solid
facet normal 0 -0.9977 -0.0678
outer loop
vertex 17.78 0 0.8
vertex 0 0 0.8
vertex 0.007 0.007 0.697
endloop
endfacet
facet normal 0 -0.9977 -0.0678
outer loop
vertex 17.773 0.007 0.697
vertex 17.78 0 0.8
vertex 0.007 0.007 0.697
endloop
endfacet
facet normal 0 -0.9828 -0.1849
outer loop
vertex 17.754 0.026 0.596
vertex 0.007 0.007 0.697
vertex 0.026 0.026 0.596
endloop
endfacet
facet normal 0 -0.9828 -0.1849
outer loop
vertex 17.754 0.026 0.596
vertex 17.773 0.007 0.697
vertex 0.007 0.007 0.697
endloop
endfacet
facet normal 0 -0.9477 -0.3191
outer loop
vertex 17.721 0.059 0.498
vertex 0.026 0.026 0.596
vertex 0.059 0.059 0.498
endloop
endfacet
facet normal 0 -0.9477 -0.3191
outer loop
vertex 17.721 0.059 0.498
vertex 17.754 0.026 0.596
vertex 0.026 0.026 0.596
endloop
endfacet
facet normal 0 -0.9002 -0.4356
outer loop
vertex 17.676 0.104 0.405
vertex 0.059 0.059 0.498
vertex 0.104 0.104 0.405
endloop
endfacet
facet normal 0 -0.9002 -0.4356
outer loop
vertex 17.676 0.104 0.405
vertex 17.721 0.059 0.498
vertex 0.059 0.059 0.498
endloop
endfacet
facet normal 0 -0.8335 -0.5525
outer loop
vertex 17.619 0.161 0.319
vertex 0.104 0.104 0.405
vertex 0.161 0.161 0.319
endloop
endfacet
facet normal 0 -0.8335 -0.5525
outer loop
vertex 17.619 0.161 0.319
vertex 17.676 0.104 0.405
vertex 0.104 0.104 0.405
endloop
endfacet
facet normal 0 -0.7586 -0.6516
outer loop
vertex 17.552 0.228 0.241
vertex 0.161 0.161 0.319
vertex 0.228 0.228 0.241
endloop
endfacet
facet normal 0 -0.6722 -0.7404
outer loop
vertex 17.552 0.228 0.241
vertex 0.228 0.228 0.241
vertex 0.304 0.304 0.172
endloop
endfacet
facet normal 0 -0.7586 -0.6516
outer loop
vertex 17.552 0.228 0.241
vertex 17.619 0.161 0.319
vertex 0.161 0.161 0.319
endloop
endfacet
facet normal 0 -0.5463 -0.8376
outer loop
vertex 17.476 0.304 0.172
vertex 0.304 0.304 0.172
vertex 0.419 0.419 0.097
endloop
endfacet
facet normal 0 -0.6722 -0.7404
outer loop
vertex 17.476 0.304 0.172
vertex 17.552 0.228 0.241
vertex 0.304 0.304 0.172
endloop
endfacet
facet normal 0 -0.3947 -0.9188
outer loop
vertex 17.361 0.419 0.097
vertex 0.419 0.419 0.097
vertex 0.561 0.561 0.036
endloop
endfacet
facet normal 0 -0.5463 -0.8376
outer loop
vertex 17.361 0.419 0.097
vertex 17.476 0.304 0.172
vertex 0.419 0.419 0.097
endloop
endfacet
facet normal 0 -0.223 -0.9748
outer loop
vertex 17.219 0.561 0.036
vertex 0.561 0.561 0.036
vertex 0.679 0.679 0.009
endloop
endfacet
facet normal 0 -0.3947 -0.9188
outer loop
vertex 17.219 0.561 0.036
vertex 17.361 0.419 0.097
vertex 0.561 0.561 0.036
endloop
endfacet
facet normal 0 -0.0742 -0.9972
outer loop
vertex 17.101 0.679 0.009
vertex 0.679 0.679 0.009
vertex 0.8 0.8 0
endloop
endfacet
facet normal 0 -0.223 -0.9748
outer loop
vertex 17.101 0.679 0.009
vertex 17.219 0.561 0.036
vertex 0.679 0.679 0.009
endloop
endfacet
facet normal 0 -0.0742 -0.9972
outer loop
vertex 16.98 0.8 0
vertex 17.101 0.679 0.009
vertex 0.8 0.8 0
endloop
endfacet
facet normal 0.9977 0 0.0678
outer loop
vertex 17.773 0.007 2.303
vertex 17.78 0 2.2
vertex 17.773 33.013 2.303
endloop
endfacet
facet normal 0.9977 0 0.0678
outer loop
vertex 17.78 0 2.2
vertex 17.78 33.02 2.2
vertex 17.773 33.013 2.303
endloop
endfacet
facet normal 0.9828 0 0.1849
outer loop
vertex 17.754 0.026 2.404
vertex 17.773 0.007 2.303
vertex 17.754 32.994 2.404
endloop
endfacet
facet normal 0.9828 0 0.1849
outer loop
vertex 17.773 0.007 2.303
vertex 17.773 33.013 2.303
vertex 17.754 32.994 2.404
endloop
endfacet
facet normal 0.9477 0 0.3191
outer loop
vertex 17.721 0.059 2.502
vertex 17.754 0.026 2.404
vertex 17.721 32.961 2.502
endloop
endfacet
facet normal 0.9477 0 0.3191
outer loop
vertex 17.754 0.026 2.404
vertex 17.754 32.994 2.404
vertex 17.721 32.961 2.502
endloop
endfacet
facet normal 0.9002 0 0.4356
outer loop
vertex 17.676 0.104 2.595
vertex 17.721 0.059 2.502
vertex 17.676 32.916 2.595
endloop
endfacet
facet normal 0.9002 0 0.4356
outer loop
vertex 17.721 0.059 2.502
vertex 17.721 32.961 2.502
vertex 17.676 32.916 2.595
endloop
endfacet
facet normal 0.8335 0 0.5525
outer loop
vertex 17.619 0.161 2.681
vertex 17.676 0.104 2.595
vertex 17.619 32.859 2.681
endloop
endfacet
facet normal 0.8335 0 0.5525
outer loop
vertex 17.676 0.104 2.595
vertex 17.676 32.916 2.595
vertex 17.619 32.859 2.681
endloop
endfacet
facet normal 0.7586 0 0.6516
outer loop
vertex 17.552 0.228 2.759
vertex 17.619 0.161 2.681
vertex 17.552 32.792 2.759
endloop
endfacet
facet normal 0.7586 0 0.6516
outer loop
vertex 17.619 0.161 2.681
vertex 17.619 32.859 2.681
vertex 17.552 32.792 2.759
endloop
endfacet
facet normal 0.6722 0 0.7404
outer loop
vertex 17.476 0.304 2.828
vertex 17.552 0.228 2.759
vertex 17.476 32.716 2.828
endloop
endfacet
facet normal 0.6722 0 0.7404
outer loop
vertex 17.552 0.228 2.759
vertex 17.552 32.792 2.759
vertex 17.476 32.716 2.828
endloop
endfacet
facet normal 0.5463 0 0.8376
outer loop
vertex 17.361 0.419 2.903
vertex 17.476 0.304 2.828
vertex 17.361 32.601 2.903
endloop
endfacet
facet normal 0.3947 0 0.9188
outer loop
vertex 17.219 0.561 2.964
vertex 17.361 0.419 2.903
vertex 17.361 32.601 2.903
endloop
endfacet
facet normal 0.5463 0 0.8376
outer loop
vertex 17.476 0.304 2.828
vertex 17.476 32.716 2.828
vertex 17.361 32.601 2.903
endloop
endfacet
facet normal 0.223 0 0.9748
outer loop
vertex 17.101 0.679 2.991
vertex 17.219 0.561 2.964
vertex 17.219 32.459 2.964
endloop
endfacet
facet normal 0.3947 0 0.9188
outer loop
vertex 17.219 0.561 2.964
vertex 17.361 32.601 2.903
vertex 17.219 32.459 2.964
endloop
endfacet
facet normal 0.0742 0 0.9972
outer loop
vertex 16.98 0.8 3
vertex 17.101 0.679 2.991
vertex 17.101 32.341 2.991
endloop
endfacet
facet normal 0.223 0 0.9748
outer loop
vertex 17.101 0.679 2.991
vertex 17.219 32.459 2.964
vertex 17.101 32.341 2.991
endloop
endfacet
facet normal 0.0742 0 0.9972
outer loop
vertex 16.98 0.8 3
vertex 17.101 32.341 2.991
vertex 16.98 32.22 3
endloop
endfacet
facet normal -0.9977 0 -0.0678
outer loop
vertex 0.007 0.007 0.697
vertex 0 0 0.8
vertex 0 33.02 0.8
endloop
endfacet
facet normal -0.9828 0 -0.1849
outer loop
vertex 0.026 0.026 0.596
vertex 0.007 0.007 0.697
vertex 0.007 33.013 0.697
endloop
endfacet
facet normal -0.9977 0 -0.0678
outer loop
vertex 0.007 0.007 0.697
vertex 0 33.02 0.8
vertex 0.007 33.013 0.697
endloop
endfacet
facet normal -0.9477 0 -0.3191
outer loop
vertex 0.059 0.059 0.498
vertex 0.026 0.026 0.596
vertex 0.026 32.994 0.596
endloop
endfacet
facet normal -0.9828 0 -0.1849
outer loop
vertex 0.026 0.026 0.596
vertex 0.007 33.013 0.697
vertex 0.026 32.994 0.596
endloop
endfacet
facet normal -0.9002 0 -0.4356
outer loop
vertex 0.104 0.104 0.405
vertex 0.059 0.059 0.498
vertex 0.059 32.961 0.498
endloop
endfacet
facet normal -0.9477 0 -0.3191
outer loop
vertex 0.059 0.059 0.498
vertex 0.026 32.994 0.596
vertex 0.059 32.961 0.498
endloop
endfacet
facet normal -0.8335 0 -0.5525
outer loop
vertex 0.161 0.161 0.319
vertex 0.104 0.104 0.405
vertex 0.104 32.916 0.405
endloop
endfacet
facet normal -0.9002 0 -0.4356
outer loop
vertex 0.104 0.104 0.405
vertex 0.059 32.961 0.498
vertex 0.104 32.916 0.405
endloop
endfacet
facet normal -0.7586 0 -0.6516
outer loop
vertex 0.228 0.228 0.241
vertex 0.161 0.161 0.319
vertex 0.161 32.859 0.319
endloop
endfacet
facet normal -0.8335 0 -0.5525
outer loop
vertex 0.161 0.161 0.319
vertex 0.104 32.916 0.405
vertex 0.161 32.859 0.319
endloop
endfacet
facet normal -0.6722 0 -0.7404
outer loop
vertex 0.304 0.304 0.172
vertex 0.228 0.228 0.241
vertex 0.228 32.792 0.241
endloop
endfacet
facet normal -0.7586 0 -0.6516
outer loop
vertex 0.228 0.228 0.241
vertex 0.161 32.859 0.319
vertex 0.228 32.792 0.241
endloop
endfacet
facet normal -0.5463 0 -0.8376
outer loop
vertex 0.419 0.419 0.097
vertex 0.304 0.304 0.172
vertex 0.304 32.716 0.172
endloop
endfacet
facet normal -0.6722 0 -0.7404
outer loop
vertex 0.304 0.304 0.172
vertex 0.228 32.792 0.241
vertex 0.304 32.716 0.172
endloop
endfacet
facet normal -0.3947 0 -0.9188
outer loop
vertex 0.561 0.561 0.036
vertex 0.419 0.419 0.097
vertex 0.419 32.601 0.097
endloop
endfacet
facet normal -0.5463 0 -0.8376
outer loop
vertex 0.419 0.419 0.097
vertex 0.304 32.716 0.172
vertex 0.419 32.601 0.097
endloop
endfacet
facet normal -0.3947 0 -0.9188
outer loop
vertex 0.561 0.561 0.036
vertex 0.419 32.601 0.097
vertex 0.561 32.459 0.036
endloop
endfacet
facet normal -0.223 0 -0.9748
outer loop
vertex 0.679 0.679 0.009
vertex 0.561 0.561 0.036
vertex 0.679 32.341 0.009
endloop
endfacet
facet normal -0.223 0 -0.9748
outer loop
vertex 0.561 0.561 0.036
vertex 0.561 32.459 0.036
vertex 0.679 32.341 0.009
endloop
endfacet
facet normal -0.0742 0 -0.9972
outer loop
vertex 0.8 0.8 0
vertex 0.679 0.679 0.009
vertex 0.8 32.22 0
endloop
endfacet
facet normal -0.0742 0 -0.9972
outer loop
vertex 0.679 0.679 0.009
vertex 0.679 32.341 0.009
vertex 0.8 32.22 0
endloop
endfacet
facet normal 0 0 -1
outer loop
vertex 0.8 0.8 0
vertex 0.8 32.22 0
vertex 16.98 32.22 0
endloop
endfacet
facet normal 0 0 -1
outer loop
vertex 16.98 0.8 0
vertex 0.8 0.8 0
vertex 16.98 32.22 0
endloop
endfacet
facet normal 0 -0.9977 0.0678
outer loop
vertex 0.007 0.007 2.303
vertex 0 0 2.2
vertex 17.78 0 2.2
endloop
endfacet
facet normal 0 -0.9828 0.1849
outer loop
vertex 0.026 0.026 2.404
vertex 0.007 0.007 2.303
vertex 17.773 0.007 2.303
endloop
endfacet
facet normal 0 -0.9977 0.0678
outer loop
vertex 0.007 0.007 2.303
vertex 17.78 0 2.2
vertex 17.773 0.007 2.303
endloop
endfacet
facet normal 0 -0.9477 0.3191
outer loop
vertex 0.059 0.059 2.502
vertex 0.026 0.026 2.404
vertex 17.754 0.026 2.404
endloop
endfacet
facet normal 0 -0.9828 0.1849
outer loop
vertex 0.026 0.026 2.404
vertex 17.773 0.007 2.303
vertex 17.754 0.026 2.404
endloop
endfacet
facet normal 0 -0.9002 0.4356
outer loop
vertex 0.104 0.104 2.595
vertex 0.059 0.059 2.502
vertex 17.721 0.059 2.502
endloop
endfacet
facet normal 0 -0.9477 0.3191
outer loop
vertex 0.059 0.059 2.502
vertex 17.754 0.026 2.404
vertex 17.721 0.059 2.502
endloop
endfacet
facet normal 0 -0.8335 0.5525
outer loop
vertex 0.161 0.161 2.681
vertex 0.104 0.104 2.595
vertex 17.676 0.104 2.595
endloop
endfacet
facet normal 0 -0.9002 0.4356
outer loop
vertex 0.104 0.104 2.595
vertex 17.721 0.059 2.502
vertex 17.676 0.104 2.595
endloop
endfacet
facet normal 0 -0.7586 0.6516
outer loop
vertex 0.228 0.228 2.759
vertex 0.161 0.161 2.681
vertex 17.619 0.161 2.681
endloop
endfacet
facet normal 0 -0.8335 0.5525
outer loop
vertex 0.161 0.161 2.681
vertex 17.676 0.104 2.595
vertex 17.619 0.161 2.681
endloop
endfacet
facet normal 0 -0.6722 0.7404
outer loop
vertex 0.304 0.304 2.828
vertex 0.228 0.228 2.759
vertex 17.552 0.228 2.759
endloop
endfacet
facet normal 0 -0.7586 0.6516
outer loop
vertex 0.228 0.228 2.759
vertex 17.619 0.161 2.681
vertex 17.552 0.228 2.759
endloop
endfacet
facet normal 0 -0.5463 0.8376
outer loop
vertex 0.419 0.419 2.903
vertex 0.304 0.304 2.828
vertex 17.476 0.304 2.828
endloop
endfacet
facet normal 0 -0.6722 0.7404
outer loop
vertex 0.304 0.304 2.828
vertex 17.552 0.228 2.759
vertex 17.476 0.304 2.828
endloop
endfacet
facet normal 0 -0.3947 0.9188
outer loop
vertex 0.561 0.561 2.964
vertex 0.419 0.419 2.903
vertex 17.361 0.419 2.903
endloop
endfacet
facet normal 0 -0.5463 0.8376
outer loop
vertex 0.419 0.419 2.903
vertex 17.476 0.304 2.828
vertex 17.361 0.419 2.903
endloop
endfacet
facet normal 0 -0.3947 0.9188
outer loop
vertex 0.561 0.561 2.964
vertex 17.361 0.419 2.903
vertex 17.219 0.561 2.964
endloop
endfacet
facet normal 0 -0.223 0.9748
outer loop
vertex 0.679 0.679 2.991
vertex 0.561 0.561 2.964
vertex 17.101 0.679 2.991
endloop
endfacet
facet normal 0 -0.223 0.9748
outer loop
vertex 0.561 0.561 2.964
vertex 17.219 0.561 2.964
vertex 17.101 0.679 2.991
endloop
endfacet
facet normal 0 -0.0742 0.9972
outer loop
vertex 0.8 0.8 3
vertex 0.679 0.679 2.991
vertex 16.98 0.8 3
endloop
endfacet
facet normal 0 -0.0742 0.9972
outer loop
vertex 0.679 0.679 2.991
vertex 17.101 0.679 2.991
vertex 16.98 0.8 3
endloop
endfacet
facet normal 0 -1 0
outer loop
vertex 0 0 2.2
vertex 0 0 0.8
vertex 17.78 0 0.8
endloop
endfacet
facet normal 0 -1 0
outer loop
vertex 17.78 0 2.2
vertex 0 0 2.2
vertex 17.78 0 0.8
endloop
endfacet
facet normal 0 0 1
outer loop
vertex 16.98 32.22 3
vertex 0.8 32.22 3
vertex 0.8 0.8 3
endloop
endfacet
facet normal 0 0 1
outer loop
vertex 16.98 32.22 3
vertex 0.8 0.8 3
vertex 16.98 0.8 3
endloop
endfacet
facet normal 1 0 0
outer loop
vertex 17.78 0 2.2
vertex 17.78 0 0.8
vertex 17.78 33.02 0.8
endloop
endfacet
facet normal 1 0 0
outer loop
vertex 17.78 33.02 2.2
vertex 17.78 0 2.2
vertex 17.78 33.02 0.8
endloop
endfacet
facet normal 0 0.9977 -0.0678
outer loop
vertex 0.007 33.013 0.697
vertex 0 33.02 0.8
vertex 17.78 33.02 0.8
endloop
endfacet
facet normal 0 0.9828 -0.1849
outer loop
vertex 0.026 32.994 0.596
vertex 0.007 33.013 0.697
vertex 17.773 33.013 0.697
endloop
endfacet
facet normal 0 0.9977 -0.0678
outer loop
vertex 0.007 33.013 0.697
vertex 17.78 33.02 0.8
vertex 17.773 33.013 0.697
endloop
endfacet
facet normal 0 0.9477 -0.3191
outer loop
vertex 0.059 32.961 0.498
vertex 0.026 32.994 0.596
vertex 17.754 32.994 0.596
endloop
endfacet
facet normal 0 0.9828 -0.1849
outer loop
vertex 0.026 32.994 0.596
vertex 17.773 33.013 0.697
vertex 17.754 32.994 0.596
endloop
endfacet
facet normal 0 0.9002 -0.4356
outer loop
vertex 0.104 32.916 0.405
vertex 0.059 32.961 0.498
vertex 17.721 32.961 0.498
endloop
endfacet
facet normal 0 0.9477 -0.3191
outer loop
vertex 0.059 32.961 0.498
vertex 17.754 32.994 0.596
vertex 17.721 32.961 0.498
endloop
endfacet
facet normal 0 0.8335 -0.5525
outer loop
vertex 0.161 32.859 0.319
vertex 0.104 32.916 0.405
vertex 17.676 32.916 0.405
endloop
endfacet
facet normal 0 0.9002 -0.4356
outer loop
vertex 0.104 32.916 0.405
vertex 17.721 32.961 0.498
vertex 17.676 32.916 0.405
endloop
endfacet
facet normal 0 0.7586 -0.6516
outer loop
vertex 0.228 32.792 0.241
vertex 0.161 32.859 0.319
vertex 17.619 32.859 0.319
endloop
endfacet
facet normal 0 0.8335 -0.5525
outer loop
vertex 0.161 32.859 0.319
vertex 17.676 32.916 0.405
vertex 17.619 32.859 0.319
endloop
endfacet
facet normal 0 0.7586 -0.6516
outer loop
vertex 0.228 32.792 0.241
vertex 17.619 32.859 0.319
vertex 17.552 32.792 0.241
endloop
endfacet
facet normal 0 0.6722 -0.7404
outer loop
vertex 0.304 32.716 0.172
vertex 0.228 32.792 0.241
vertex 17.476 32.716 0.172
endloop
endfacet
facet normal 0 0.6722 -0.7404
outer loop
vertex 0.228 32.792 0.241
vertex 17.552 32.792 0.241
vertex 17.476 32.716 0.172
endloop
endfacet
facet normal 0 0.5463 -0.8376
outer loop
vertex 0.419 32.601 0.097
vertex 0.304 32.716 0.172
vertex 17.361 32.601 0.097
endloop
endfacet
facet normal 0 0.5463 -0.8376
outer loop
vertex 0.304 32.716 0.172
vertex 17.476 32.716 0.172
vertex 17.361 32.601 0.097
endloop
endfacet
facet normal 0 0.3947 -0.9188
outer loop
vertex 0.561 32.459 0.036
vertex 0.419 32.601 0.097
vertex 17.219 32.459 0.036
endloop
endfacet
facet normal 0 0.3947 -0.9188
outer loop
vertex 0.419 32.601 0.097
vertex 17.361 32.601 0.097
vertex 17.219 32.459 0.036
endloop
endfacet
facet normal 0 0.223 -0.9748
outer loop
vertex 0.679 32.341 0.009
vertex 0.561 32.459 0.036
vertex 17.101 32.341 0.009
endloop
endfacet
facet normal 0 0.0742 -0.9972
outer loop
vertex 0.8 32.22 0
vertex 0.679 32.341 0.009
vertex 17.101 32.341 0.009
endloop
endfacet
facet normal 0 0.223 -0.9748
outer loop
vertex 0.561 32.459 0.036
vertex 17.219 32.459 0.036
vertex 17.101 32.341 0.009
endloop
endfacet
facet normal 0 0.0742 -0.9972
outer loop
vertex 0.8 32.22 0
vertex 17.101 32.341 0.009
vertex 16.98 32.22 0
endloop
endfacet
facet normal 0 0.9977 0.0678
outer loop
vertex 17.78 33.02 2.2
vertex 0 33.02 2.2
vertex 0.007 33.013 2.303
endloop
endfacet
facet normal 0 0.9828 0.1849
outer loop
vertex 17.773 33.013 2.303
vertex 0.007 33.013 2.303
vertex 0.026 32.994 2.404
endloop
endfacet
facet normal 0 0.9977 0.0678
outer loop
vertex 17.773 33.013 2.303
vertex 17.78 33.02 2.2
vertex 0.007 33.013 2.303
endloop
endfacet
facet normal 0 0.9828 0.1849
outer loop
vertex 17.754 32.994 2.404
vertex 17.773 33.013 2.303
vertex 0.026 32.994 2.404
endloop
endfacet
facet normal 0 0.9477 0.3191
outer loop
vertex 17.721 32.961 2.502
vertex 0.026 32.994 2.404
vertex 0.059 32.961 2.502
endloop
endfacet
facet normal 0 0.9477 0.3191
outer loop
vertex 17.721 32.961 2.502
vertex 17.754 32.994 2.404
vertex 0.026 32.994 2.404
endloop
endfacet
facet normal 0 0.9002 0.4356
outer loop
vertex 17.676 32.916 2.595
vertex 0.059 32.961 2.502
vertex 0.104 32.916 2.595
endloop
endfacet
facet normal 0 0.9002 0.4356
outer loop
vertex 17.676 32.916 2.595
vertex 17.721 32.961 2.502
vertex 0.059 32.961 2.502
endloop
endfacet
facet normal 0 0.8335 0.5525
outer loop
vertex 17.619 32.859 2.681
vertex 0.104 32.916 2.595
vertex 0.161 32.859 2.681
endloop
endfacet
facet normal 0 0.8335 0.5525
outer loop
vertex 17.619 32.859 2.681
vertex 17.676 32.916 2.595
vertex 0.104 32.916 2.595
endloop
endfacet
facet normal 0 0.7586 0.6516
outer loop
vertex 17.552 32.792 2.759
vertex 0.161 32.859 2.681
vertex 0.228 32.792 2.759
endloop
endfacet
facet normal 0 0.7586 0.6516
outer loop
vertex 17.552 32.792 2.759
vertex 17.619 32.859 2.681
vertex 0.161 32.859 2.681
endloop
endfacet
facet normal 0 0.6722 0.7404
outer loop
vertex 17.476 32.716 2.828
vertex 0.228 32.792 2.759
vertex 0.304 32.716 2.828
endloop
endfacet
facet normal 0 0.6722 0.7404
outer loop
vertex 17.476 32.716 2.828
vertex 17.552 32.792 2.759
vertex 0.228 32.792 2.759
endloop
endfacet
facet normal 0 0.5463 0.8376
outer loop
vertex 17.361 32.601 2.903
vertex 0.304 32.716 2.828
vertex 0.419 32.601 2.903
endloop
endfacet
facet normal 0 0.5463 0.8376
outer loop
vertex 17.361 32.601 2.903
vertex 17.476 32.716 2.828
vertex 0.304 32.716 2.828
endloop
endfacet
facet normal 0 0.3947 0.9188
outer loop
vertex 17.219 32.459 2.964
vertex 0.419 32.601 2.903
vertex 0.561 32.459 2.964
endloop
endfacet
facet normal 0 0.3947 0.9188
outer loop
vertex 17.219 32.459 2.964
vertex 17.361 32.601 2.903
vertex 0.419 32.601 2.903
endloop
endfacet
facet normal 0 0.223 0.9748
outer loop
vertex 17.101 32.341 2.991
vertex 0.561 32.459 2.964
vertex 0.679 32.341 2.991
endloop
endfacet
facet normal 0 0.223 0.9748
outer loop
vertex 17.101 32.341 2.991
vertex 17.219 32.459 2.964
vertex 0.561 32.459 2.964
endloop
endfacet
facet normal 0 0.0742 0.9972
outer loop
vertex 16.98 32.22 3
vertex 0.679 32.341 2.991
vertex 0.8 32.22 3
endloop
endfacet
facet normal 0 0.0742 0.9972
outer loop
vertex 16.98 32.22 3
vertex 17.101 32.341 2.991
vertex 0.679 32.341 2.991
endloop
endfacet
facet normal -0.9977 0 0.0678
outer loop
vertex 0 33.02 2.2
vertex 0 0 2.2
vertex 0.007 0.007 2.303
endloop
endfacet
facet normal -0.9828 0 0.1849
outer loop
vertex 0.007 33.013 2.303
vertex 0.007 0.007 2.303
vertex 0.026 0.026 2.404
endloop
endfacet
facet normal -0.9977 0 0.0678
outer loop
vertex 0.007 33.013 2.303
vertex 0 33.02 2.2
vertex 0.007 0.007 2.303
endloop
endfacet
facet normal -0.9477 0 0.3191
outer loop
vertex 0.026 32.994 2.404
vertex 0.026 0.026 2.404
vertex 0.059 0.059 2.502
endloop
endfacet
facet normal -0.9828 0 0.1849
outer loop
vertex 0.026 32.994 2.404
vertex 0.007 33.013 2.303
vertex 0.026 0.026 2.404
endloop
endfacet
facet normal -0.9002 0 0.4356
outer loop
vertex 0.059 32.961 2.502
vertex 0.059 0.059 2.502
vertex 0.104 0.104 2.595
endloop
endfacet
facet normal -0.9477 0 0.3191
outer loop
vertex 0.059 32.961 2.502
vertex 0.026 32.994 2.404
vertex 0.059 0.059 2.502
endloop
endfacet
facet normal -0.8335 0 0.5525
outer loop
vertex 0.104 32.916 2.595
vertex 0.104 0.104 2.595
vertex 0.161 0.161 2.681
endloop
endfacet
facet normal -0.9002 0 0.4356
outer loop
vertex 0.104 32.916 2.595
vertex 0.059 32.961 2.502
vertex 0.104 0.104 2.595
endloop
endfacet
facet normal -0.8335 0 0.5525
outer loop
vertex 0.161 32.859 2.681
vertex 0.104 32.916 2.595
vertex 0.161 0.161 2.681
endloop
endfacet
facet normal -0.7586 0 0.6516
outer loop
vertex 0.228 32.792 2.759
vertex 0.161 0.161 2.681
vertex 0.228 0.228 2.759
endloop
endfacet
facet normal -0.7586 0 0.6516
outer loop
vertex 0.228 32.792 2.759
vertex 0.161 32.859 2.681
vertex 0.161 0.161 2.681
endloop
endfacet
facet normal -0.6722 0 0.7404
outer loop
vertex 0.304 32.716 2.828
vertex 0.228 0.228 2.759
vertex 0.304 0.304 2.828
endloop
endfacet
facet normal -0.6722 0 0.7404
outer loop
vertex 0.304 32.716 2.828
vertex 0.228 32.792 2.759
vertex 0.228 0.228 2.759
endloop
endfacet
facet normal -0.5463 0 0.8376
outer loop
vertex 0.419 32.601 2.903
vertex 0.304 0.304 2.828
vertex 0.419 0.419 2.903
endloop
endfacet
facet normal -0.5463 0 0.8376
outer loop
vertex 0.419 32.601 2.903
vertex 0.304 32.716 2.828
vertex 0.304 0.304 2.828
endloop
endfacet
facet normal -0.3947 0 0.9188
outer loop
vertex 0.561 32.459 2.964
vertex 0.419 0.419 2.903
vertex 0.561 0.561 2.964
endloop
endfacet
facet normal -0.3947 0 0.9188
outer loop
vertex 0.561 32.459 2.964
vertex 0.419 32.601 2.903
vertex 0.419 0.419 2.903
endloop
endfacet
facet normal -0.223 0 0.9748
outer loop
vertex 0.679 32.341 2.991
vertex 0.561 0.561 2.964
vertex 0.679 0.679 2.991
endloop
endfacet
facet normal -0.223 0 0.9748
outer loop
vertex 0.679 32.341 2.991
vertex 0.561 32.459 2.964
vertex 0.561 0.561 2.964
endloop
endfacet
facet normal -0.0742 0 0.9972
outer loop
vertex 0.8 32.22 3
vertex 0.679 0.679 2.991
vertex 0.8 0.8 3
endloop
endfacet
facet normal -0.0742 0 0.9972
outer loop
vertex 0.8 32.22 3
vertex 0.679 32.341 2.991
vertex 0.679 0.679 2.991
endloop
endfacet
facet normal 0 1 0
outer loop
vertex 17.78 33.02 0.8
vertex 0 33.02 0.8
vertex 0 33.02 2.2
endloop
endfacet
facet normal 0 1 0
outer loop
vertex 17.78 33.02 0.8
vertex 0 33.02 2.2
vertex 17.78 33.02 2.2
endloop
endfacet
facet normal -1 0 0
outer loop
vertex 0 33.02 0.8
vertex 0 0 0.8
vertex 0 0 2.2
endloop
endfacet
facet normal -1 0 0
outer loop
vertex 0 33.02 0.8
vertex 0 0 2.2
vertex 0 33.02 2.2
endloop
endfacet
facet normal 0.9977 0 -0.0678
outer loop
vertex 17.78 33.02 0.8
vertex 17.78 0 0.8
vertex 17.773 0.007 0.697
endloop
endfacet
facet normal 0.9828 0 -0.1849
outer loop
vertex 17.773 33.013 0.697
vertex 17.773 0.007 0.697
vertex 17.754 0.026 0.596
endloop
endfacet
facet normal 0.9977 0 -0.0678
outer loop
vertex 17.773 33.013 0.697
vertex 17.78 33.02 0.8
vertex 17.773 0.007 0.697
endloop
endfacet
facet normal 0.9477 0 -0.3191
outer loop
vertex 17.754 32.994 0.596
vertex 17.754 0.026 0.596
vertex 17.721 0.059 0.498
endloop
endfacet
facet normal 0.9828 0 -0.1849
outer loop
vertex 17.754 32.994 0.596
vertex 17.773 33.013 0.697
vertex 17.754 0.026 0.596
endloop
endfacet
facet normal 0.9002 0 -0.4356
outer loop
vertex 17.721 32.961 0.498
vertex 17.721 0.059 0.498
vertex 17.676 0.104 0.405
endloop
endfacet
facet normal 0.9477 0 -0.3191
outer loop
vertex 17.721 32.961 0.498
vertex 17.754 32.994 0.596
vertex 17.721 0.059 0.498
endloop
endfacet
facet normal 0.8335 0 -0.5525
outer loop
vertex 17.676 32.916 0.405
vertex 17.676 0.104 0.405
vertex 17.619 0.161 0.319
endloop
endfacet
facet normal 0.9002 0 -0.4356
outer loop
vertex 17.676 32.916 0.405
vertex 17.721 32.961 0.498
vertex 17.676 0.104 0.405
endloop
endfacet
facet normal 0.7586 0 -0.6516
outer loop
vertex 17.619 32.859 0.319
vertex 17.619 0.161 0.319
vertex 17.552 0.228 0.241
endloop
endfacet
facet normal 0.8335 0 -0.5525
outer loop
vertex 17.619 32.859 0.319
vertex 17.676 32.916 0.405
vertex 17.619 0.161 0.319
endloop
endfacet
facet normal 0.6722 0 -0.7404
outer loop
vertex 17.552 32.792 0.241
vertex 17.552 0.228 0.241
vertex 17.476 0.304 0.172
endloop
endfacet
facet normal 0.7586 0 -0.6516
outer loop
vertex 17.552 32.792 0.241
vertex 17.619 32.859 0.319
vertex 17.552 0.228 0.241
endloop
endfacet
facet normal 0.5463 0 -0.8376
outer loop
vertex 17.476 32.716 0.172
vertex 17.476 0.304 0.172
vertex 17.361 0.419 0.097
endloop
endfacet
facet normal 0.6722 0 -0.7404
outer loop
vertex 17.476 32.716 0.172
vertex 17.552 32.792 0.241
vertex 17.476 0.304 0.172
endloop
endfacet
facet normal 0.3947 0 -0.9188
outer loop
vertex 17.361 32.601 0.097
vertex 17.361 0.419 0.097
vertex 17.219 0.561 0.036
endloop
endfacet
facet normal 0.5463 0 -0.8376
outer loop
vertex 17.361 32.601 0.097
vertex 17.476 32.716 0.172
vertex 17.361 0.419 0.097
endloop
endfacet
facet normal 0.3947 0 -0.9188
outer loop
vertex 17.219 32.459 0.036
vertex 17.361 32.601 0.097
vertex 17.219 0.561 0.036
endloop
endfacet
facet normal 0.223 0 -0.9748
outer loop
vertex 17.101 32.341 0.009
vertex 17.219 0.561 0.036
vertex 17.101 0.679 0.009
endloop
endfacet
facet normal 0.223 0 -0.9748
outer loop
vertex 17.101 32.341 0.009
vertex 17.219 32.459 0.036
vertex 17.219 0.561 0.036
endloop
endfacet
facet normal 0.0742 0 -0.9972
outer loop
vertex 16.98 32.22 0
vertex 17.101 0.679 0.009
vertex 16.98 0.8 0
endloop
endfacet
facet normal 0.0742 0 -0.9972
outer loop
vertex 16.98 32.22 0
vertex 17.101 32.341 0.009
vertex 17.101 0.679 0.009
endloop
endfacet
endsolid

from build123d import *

# Parameters (mm, degrees)
SKETCH1_W           = 17.78
SKETCH1_H           = 33.02
BOSS_EXTRUDE1_DEPTH = 3
FILLET2_R           = 0.8


with BuildPart() as part:
    # Sketch1 → Boss-Extrude1 (new body)
    with BuildSketch(Plane.XY):
        with Locations((8.89, 16.51)):
            Rectangle(SKETCH1_W, SKETCH1_H)
    extrude(amount=BOSS_EXTRUDE1_DEPTH)

    # Fillet2
    fillet2_edges = [part.edges().sort_by_distance(p)[0] for p in [
        (17.78, 16.51, 3),
        (8.89, 33.02, 3),
        (0, 16.51, 3),
        (8.89, 33.02, 0),
        (17.78, 16.51, 0),
        (8.89, 0, 0),
        (0, 16.51, 0),
        (8.89, 0, 3),
    ]]
    fillet(fillet2_edges, radius=FILLET2_R)


solid = part.part
